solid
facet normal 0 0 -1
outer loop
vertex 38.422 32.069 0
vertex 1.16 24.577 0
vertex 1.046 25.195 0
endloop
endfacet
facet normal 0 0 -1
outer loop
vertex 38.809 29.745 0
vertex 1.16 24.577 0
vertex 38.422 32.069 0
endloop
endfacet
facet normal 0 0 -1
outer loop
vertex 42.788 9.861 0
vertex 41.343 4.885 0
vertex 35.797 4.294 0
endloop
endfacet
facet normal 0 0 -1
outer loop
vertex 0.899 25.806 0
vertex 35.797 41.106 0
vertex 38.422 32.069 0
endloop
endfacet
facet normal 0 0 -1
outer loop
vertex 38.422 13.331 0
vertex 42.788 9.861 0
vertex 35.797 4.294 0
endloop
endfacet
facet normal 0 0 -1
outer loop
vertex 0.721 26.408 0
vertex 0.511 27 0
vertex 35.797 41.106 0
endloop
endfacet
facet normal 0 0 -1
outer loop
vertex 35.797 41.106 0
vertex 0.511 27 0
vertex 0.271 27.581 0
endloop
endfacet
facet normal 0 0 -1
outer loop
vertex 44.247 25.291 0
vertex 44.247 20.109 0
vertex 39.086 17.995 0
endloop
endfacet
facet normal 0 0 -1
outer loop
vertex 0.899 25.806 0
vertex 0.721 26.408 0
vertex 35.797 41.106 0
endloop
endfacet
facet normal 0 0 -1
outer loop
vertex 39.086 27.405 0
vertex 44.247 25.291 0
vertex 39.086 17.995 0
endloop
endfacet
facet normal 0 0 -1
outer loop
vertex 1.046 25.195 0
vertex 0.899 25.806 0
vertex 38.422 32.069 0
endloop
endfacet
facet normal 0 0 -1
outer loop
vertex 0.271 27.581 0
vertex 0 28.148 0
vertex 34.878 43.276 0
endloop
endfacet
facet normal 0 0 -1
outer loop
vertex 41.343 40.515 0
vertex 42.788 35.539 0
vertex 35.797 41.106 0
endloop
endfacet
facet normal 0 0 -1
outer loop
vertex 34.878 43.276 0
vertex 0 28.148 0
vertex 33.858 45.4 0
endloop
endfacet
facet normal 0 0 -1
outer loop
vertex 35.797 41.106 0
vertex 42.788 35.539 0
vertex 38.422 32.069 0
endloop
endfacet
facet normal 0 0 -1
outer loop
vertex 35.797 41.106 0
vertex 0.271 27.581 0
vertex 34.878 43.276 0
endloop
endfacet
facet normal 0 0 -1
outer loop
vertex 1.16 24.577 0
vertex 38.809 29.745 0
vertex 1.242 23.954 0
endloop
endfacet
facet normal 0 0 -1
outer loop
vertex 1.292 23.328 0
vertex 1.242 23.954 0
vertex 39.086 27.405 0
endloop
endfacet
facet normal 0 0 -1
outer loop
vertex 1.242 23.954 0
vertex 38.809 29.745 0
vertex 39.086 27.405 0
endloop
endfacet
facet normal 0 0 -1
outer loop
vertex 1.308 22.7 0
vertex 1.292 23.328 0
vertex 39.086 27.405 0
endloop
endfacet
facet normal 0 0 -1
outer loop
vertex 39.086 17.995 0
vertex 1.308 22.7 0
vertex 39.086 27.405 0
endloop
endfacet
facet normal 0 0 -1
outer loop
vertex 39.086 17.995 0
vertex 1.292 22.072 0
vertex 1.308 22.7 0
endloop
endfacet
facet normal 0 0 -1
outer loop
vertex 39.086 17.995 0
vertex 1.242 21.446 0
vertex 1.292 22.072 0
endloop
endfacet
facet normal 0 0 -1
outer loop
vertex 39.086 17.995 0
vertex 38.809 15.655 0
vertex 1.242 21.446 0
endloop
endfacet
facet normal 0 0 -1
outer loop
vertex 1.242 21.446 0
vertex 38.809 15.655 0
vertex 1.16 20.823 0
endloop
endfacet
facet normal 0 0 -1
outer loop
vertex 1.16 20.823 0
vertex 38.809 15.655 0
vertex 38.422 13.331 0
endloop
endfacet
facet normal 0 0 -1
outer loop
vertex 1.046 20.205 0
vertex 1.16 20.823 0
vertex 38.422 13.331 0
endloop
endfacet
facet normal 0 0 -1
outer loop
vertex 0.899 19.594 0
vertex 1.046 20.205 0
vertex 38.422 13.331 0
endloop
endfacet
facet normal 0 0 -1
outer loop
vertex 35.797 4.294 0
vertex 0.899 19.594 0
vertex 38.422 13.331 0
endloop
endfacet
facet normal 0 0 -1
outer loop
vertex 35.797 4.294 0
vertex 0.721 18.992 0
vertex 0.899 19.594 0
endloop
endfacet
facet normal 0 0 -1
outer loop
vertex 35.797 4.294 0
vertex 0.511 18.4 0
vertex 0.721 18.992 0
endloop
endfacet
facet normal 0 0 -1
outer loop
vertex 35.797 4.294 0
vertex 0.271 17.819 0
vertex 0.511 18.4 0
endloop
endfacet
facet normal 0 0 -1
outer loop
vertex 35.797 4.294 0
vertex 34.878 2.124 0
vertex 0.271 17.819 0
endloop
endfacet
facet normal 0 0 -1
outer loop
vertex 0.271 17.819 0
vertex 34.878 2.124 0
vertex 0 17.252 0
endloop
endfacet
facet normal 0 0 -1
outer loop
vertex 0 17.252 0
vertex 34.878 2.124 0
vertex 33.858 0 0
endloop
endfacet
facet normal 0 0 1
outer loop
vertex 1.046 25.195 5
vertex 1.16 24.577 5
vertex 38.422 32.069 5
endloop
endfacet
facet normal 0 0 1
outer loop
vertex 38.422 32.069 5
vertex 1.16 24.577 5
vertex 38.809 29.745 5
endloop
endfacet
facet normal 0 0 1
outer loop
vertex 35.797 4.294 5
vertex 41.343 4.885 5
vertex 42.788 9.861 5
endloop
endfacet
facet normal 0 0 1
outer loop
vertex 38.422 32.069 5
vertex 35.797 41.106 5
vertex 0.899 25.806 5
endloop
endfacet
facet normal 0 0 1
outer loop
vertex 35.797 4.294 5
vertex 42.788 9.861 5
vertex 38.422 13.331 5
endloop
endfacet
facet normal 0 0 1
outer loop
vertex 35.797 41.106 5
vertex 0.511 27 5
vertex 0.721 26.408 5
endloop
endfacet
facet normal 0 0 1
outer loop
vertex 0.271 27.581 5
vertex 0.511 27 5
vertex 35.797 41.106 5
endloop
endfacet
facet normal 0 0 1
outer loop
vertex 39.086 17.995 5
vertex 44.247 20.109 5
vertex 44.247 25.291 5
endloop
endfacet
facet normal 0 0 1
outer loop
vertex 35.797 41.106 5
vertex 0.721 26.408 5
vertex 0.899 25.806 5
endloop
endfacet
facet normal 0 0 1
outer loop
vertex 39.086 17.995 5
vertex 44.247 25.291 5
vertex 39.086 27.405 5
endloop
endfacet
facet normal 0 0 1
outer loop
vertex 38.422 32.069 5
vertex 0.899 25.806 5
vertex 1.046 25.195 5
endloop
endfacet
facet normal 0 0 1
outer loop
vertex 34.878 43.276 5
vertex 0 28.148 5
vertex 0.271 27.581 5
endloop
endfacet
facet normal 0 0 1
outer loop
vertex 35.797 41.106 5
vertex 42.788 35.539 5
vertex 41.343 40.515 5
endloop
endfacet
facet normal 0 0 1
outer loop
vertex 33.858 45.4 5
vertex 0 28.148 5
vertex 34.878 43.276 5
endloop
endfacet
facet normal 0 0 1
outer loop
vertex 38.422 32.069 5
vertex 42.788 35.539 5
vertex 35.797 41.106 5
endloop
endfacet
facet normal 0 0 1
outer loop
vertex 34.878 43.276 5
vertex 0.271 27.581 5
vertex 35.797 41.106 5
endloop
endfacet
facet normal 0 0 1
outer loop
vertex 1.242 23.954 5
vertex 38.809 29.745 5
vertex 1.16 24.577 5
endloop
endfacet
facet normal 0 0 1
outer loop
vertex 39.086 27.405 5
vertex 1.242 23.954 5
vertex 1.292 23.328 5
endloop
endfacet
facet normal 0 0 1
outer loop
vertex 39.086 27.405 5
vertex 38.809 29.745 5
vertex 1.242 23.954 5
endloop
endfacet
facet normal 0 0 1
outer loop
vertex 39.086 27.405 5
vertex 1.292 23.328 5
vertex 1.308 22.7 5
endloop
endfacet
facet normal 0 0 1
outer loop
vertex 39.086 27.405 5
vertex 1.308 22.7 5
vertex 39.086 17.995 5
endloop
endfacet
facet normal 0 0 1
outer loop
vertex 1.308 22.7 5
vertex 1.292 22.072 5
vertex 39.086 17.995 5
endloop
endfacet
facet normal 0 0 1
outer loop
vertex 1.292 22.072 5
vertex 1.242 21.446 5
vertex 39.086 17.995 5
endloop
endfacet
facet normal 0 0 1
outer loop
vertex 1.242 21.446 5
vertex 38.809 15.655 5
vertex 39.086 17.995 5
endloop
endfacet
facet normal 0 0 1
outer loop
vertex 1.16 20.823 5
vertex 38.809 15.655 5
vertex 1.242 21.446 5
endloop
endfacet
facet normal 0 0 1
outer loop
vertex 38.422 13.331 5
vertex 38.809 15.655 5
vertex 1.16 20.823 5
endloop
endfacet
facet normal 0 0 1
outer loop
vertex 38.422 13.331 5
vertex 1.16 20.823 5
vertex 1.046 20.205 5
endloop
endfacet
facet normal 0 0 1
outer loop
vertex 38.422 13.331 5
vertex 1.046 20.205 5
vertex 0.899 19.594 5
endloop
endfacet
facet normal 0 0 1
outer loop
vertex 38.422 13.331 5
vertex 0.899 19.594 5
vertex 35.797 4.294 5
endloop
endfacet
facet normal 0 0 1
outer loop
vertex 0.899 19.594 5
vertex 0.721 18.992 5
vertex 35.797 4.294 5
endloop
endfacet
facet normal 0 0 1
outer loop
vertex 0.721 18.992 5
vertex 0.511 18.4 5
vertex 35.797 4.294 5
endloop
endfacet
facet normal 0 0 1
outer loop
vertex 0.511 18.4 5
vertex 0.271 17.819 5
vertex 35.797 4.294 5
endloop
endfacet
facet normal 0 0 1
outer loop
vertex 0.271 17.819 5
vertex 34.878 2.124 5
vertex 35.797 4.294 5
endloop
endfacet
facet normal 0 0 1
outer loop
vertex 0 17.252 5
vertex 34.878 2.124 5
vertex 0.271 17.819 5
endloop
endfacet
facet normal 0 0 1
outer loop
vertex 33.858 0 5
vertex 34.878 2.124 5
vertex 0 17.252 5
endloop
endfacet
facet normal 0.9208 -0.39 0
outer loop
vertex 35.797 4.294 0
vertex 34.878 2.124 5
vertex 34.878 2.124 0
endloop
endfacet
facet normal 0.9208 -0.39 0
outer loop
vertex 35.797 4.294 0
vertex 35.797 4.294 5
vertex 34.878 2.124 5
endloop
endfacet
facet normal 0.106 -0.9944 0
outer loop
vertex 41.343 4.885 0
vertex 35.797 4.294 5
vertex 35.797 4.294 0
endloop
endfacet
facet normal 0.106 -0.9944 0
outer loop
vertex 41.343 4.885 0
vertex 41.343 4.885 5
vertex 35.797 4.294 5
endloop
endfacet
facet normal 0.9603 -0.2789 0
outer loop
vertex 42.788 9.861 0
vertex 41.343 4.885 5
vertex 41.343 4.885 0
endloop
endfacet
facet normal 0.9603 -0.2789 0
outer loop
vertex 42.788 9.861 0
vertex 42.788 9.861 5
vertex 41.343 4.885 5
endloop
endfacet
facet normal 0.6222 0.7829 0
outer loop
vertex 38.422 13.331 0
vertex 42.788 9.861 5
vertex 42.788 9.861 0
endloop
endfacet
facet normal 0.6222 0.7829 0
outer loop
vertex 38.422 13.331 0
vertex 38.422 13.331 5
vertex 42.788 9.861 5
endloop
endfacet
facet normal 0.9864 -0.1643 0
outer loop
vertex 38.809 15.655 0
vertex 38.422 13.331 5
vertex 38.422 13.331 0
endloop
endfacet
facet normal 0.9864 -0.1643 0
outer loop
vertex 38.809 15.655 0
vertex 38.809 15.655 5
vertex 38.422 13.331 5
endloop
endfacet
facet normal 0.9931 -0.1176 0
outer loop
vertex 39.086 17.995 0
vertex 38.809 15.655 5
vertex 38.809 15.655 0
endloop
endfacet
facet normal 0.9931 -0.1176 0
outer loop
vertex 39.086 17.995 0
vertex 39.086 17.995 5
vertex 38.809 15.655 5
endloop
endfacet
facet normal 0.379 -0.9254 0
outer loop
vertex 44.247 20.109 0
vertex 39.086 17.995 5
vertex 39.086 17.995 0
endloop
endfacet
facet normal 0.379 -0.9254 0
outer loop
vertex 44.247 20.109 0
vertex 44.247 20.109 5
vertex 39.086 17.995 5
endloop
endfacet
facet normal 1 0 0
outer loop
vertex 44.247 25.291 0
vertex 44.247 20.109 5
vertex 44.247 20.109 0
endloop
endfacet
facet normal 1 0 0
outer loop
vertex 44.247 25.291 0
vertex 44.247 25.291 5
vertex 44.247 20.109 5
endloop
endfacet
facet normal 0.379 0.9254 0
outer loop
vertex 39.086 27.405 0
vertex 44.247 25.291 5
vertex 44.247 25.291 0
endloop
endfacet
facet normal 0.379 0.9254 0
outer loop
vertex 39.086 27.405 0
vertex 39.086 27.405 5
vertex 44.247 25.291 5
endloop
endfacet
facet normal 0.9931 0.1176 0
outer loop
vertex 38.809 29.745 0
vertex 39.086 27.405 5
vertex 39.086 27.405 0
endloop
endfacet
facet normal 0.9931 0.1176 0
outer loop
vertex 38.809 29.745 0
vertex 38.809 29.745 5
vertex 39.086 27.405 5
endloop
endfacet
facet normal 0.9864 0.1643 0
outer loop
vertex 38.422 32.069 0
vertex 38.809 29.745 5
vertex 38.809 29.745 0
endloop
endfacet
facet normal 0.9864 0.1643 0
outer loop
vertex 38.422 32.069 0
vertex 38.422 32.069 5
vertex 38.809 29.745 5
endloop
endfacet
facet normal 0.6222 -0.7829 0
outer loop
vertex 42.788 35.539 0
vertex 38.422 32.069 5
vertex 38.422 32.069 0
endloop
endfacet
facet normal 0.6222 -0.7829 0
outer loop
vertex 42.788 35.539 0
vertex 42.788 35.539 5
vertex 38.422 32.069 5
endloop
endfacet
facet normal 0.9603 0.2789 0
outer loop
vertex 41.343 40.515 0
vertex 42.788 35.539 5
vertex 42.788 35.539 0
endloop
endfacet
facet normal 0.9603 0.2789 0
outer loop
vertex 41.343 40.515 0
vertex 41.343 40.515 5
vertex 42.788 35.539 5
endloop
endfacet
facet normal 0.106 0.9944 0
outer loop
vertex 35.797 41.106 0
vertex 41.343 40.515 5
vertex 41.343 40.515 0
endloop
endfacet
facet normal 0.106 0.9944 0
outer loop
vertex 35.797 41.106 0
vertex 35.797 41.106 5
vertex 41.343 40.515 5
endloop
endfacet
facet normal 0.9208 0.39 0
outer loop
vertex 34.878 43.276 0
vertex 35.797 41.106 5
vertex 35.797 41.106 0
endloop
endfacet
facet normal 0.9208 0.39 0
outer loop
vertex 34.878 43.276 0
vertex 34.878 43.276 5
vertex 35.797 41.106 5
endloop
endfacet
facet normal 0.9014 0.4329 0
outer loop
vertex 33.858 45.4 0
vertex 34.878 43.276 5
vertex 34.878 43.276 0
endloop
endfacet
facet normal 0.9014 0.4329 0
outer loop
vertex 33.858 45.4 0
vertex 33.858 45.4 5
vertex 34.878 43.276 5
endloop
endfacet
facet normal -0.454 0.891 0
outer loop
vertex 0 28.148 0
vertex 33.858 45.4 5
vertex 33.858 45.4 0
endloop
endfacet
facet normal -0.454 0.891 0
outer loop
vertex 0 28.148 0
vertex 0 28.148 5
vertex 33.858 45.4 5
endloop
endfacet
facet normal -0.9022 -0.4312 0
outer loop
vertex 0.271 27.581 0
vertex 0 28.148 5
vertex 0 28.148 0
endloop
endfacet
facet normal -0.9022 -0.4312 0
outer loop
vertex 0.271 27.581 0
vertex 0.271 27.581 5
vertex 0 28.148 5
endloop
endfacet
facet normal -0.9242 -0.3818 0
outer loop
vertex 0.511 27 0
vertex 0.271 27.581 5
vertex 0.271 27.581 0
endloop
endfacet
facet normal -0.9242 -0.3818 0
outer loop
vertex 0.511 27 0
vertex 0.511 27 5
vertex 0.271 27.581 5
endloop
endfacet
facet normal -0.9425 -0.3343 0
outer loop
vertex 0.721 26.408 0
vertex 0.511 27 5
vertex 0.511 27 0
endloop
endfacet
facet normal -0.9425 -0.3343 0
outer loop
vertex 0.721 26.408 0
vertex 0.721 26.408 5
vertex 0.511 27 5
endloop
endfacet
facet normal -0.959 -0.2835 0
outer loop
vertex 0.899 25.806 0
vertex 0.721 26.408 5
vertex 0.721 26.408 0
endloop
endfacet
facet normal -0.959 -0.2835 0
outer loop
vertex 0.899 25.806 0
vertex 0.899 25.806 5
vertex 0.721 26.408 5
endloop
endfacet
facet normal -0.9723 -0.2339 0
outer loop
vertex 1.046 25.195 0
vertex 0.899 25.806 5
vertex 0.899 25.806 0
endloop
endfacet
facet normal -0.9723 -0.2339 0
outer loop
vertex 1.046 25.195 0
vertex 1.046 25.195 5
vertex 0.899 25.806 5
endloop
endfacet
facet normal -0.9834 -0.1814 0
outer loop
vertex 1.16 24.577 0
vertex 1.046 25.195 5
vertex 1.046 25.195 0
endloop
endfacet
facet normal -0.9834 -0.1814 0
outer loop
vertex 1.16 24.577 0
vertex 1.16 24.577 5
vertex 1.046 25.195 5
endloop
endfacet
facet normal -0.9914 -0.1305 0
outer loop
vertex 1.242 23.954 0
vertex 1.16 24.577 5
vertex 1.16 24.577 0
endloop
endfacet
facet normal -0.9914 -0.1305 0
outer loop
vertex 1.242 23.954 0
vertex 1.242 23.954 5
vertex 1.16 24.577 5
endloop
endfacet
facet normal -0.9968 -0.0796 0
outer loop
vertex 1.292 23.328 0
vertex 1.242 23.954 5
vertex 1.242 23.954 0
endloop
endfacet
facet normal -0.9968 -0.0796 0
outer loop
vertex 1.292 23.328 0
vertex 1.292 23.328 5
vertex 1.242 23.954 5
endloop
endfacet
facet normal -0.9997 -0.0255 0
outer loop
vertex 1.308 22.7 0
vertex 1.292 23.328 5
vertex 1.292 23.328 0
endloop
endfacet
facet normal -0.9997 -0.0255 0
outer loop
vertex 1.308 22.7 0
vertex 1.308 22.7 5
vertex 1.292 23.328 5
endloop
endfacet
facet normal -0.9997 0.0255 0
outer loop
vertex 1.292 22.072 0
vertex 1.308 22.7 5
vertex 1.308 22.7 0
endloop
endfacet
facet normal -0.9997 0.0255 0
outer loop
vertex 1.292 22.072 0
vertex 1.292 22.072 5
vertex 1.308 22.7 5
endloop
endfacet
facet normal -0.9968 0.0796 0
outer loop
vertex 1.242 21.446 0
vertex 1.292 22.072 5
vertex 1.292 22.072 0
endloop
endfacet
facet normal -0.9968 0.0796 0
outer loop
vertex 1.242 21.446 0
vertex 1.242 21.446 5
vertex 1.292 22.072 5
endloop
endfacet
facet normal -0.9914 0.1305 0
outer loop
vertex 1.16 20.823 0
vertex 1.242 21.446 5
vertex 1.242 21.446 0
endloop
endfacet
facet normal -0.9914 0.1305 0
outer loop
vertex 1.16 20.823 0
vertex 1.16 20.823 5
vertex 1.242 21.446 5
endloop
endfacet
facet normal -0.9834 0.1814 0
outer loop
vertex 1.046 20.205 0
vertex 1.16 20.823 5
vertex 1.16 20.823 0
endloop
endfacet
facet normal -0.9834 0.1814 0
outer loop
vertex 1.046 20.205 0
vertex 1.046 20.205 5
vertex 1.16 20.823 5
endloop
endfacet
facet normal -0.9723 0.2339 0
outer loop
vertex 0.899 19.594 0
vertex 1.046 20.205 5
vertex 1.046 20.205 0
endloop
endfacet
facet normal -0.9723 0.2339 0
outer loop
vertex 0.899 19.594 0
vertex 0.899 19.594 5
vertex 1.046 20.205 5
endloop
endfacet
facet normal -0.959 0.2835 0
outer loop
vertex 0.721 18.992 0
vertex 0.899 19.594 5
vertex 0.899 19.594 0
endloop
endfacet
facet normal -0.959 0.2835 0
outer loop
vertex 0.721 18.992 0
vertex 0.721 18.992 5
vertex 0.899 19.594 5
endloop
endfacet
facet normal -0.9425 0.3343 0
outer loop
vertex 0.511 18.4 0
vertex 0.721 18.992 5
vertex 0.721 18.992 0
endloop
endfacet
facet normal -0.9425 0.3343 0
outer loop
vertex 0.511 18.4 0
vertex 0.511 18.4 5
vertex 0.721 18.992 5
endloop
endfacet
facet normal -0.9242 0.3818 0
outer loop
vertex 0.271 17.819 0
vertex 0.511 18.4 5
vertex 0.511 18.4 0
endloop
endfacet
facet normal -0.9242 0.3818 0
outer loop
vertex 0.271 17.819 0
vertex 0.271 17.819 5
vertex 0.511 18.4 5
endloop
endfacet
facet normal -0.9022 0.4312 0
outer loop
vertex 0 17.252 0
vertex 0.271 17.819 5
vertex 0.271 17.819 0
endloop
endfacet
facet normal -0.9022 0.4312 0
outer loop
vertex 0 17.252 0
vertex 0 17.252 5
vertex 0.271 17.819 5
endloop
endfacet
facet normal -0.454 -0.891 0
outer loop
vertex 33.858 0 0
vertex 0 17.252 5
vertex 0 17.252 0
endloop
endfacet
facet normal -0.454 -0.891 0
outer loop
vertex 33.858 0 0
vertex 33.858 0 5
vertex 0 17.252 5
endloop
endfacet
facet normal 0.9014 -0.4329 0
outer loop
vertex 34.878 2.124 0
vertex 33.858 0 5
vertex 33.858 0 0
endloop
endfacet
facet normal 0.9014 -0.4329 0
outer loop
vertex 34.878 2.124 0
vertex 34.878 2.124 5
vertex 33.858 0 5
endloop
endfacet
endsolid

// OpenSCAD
$fn = 32;

// ----------------------------------------------------------------------
// Gear sector: 3 teeth on 54 degrees
// ----------------------------------------------------------------------

// --- parameters (mm) ---
sector_angle = 54;        // sector angle, degrees
root_r = 50;              // root circle radius
tooth_h = 5;              // tooth height over the root circle
teeth = 3;                // number of teeth on the sector
hub_r = 12;               // hub bore radius
plate_t = 5;              // sector thickness, Z
arc_step = 3;             // sampling step of the root/hub arcs, degrees

tip_r = root_r + tooth_h;  // tip circle radius

profile = [[33.858, 0], [34.878, 2.124], [35.797, 4.294], [41.343, 4.885], [42.788, 9.861], [38.422, 13.331], [38.809, 15.655], [39.086, 17.995], [44.247, 20.109], [44.247, 25.291], [39.086, 27.405], [38.809, 29.745], [38.422, 32.069], [42.788, 35.539], [41.343, 40.515], [35.797, 41.106], [34.878, 43.276], [33.858, 45.4], [0, 28.148], [0.271, 27.581], [0.511, 27], [0.721, 26.408], [0.899, 25.806], [1.046, 25.195], [1.16, 24.577], [1.242, 23.954], [1.292, 23.328], [1.308, 22.7], [1.292, 22.072], [1.242, 21.446], [1.16, 20.823], [1.046, 20.205], [0.899, 19.594], [0.721, 18.992], [0.511, 18.4], [0.271, 17.819], [0, 17.252]];  // primary outline, 37 points, counter clockwise

// --- the one profile operation ---
linear_extrude(height = plate_t) polygon(points = profile);
